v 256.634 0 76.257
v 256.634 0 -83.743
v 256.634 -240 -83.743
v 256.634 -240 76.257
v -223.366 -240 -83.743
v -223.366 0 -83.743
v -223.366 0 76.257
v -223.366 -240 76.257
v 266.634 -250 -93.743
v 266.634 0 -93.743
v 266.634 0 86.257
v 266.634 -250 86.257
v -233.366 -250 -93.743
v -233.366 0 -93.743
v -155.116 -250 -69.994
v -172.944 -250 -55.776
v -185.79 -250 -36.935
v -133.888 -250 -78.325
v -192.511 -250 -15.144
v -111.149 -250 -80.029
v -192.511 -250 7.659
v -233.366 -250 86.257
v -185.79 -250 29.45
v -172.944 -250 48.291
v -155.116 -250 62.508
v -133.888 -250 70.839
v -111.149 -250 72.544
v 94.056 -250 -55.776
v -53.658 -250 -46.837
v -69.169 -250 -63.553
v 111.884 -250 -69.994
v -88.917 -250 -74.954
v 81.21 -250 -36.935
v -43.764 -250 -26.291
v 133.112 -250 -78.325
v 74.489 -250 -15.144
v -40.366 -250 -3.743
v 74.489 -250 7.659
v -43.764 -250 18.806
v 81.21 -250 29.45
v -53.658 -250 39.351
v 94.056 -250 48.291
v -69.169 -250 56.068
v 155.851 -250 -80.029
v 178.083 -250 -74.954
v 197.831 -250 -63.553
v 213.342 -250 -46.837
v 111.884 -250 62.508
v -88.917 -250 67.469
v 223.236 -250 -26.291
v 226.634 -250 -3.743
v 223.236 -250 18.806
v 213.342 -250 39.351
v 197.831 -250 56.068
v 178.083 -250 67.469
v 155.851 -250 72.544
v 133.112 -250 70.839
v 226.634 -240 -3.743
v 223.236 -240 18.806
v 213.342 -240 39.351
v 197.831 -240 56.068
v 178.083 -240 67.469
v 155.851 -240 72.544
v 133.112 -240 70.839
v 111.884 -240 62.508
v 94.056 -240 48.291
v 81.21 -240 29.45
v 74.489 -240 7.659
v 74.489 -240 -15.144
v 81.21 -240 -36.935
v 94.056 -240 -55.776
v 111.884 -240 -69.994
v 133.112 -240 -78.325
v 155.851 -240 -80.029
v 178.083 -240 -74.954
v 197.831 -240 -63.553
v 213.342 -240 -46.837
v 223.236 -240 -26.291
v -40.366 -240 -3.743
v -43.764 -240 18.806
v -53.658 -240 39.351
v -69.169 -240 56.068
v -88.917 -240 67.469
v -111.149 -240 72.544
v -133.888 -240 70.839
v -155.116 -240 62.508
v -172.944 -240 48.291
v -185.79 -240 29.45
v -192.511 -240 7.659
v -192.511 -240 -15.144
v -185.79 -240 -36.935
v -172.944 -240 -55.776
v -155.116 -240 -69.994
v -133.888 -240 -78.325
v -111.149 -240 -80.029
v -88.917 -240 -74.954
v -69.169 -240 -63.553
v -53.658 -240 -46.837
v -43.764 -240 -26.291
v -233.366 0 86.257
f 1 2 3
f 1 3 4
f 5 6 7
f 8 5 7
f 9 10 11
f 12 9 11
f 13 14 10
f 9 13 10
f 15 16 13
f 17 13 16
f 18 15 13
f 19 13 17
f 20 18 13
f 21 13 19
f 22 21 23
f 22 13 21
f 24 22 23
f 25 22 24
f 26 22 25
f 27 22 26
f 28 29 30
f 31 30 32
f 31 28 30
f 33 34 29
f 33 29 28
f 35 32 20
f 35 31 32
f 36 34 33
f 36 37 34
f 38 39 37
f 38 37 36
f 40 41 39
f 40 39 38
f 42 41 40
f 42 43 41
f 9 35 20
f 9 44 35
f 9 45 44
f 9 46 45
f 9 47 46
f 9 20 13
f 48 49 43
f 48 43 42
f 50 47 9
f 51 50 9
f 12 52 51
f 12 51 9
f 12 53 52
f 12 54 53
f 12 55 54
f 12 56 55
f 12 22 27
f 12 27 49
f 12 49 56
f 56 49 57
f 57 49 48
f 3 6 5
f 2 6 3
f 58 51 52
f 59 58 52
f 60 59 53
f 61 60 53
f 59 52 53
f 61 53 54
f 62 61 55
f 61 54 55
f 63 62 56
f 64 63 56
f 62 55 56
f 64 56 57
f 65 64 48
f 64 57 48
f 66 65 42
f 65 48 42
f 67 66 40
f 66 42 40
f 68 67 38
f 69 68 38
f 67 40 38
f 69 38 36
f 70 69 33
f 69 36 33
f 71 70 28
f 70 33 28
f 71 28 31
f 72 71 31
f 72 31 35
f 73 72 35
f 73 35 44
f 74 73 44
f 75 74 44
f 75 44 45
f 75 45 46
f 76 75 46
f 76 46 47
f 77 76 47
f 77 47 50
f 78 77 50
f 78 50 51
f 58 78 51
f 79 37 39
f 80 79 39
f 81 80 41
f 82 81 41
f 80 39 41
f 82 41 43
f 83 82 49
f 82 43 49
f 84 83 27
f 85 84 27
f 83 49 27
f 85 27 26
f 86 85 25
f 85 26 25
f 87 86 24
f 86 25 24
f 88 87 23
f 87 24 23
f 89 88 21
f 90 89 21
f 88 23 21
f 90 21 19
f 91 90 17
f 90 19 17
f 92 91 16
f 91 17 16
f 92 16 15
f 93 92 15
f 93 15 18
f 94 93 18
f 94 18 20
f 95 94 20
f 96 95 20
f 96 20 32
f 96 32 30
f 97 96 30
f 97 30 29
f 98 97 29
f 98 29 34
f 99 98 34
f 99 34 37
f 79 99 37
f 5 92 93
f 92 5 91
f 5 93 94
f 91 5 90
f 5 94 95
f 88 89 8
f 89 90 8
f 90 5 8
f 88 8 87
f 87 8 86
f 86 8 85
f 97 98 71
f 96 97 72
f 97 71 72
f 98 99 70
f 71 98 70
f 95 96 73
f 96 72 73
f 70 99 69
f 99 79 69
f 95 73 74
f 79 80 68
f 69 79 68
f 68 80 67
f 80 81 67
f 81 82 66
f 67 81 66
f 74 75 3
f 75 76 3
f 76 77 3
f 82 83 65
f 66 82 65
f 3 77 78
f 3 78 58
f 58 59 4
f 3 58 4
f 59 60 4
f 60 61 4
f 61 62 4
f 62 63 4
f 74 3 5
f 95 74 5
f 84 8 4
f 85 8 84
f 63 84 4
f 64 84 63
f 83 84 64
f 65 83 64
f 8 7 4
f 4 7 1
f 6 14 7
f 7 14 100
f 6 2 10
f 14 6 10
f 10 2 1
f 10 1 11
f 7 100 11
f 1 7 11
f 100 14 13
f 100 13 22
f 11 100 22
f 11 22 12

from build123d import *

# Parameters (mm, degrees)
F0_W     = 500
F0_H     = 180
F1_DEPTH = 250
F2_T     = -10
F3_R     = 76.5
F4_DEPTH = 25


with BuildPart() as f1:
    # F0 (on Front) → F1 (new body)
    with BuildSketch(Plane.XZ):
        with Locations((16.63438, -3.742575)):
            Rectangle(F0_W, F0_H)
    extrude(amount=F1_DEPTH)

    # F2
    f2_openings = [f1.faces().sort_by_distance(p)[0] for p in [
        (16.63438, 0, -3.742575),
    ]]
    offset(amount=F2_T, openings=f2_openings)

    # F3 (on face) → F4 (cut)
    with BuildSketch(Plane.XZ.offset(250)):
        with Locations((-116.86562, -3.742575)):
            Circle(F3_R)
        with Locations((150.13438, -3.742575)):
            Circle(F3_R)
    extrude(amount=-F4_DEPTH, mode=Mode.SUBTRACT)


solid = f1.part
